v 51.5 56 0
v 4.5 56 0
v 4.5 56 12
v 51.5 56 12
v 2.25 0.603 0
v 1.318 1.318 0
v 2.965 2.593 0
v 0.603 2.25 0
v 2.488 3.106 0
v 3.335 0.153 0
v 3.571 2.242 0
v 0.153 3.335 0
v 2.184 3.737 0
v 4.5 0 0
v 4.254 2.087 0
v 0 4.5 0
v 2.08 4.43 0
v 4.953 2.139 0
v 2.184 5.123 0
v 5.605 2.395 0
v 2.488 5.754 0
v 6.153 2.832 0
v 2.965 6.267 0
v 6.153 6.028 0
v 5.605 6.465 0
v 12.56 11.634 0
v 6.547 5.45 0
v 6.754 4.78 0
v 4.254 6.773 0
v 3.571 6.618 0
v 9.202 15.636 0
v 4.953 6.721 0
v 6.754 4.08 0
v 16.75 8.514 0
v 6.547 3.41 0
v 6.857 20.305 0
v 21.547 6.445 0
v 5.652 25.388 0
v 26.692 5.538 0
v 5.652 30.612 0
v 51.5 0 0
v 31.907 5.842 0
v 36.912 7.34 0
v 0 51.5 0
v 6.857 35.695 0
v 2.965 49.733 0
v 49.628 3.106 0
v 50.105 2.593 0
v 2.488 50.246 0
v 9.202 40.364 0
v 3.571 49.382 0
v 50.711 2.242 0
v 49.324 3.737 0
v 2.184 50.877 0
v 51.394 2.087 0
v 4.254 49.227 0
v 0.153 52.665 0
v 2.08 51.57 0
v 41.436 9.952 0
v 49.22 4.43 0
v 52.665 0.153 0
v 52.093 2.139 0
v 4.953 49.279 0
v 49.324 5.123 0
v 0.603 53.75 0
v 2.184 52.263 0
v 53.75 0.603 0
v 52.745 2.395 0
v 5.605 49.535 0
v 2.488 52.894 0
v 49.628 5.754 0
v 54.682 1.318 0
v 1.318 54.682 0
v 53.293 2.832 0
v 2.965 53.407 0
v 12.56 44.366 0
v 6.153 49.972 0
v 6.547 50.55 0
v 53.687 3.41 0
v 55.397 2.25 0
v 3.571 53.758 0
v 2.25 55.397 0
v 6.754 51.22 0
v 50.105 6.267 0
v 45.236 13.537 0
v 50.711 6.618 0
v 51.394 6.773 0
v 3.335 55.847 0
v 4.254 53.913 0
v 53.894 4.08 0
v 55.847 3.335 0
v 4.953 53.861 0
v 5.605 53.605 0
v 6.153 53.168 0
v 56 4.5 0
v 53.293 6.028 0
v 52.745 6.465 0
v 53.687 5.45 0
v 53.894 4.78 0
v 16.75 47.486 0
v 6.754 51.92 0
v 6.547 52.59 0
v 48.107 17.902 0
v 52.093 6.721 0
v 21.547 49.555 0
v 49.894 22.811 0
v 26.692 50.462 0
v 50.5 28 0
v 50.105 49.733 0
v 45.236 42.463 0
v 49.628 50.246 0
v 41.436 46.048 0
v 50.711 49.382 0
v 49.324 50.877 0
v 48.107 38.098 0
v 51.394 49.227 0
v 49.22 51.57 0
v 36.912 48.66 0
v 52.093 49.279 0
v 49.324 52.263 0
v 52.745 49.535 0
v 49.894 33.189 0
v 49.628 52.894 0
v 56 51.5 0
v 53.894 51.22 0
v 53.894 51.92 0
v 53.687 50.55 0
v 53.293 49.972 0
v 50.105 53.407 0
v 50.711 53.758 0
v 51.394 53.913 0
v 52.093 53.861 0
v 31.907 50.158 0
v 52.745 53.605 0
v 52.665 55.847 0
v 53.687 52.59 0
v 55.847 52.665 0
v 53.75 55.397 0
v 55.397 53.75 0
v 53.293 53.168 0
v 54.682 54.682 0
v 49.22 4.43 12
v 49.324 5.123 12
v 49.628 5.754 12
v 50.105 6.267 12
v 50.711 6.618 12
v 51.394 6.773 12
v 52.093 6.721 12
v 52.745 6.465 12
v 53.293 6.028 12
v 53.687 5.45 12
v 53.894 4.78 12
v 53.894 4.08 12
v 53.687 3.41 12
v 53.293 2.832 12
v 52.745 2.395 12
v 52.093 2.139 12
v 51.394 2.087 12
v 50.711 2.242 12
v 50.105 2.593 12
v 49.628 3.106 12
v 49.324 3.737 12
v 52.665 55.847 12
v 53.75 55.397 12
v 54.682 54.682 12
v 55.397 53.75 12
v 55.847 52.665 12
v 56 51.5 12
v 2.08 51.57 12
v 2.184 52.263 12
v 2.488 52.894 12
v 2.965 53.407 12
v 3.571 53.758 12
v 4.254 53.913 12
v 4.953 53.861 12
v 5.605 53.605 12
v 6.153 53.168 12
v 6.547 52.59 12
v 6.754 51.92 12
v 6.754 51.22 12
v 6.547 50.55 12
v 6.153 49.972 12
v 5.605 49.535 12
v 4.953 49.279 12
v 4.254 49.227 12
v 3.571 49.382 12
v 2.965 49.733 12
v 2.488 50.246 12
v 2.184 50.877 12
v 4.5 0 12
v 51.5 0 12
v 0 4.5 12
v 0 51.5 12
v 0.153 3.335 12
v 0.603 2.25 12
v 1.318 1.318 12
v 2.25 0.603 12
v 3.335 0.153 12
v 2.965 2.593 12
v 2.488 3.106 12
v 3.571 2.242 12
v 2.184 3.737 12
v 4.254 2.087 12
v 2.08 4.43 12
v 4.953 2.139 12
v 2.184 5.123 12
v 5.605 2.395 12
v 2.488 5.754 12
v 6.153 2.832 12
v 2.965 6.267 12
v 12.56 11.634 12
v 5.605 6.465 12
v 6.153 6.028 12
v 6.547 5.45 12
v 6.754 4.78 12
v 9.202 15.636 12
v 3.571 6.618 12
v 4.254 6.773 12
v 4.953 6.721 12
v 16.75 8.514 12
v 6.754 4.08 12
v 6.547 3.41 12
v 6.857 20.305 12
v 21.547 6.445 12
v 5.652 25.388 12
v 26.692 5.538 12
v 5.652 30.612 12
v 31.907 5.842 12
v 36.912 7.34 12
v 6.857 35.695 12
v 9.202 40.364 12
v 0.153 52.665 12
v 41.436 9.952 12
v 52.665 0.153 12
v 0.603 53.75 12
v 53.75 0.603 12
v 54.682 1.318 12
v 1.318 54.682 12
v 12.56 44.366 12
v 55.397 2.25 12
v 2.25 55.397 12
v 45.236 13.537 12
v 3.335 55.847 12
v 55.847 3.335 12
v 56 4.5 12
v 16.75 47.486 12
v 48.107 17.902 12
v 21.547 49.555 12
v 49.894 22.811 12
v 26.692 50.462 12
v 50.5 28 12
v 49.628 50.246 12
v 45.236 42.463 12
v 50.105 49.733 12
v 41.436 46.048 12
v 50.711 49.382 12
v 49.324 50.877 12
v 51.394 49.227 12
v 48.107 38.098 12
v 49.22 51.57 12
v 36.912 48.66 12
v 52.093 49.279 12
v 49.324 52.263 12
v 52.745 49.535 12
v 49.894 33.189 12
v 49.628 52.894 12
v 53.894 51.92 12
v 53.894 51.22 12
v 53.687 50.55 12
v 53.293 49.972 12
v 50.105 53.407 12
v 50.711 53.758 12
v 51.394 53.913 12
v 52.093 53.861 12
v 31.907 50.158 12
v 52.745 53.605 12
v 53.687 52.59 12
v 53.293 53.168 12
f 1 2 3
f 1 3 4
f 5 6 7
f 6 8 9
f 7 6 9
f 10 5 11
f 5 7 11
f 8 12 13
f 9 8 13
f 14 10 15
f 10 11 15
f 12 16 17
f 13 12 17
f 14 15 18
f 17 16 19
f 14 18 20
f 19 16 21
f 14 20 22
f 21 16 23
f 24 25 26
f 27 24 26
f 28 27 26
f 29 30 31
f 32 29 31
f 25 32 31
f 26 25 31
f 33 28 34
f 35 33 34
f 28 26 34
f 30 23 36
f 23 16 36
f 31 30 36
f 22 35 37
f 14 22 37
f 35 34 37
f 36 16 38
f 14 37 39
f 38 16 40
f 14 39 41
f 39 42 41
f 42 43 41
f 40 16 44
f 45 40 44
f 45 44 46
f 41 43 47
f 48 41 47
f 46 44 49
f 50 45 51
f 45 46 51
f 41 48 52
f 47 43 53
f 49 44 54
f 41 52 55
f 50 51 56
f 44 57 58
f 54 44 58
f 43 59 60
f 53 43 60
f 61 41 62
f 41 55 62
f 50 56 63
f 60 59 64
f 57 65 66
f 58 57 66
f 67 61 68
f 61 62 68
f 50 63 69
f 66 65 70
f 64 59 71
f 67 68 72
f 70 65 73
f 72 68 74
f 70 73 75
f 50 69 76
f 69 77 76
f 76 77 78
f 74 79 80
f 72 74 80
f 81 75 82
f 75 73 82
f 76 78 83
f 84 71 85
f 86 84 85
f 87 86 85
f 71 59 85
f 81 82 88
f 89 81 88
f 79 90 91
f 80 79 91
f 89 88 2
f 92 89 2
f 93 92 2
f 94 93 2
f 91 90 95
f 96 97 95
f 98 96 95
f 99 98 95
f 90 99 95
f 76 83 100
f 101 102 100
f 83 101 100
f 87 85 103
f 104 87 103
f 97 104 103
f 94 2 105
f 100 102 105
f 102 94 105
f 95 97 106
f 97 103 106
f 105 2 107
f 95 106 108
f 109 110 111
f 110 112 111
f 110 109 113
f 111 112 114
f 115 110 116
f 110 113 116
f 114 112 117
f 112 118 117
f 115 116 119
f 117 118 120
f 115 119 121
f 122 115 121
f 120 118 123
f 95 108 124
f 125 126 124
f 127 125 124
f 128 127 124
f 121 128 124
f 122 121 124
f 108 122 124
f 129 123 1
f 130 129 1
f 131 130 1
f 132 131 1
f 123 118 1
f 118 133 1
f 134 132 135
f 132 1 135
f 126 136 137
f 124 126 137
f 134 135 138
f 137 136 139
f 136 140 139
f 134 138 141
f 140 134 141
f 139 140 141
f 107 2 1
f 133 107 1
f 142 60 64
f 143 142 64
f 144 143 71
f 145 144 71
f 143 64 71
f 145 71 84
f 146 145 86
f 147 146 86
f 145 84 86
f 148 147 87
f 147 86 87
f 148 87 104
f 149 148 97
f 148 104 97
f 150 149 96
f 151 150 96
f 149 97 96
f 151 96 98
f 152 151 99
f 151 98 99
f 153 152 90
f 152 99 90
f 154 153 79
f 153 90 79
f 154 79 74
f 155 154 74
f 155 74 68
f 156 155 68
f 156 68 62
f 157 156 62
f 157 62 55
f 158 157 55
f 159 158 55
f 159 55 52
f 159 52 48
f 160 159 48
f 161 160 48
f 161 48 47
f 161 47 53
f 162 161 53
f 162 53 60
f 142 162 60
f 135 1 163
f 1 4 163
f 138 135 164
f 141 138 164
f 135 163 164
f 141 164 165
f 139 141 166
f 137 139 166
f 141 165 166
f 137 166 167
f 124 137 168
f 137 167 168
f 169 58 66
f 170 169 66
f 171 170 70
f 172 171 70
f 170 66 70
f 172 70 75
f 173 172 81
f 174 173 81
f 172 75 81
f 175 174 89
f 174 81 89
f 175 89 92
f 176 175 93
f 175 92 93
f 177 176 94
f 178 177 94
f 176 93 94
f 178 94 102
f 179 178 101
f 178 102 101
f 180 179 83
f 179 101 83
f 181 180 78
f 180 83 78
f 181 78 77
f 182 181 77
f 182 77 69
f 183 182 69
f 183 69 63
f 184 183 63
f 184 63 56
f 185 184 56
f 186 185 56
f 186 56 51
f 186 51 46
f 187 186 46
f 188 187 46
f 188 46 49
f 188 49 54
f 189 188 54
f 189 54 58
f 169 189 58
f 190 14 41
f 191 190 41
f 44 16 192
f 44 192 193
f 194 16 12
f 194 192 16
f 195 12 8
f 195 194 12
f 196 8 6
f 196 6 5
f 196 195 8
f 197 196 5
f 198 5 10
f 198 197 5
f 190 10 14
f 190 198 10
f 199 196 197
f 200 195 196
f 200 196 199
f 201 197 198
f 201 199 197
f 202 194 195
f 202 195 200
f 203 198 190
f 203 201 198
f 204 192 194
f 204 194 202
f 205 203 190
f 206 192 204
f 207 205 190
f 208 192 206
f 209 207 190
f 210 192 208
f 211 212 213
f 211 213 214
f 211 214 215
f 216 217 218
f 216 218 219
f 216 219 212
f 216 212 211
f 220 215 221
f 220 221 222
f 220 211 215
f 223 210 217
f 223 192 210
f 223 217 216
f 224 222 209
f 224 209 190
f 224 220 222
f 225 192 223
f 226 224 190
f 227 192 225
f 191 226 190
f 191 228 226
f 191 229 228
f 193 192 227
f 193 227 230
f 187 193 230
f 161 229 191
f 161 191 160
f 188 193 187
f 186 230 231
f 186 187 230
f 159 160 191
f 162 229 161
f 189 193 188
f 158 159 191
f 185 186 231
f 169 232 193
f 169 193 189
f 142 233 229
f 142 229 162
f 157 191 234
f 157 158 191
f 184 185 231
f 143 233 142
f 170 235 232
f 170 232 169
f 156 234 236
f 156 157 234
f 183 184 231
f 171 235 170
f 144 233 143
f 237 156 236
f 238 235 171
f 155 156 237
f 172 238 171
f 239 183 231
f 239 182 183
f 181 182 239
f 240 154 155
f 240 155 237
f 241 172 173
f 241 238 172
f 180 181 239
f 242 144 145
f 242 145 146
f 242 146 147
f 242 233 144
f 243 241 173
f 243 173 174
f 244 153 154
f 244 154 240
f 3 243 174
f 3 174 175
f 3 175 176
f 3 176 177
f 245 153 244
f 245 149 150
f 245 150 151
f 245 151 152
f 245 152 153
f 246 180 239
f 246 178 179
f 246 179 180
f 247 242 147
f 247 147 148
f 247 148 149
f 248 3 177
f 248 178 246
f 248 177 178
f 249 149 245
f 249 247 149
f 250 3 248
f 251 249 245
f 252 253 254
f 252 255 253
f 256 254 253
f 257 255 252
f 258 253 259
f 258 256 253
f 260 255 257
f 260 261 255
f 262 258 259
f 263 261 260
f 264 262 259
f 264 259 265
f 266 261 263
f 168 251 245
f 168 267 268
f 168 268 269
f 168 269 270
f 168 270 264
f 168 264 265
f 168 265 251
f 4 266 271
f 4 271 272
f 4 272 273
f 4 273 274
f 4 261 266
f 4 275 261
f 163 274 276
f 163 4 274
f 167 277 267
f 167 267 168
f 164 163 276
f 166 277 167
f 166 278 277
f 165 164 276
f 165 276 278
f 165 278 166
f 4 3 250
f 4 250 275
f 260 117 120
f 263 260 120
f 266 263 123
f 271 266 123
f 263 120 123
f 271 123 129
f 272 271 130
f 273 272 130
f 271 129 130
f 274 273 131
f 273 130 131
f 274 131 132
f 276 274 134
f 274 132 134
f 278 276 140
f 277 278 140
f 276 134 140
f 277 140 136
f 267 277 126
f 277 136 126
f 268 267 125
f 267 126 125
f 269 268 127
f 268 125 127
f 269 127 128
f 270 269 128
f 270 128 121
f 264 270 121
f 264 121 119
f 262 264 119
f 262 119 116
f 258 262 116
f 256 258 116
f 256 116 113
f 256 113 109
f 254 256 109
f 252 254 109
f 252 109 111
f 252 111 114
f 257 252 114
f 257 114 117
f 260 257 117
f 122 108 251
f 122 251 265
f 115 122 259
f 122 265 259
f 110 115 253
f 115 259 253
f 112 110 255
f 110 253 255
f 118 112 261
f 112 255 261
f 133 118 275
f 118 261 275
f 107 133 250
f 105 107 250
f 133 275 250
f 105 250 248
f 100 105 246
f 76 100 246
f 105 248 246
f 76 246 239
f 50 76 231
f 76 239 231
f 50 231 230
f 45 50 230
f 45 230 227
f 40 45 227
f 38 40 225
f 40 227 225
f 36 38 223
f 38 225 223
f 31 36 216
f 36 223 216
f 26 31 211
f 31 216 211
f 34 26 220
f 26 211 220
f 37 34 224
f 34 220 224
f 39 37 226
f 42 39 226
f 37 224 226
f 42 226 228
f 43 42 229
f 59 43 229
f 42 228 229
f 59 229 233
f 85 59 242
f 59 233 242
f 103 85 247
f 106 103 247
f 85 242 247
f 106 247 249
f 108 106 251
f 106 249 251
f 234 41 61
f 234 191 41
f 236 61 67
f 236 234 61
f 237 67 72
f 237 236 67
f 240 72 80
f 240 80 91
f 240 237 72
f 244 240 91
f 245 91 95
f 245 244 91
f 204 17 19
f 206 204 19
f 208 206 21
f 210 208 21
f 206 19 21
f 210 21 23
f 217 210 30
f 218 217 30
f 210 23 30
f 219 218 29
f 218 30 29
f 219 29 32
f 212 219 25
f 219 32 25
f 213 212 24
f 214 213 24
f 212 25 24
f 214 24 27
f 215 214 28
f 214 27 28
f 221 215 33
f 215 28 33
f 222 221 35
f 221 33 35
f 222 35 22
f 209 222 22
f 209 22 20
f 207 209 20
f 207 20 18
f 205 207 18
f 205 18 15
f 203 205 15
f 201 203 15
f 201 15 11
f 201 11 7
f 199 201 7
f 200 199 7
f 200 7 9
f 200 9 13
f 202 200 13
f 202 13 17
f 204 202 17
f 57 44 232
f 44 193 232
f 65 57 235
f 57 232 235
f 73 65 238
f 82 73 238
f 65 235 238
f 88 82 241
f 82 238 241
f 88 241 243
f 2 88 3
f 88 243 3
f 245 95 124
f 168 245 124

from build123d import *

# Parameters (mm, degrees)
F0_W     = 56
F0_H     = 56
F1_DEPTH = 12
F2_R     = 22.5
F3_DEPTH = 12
F5_D     = 4.7
F6_R     = 4.5


with BuildPart() as f1:
    # F0 (on Top) → F1 (new body)
    with BuildSketch(Plane.XY):
        with Locations((28, 28)):
            Rectangle(F0_W, F0_H)
    extrude(amount=F1_DEPTH)

    # F2 (on face) → F3 (cut, through all)
    with BuildSketch(Plane.XY.offset(12)):
        with Locations((28, 28)):
            Circle(F2_R)
    extrude(amount=-F3_DEPTH, mode=Mode.SUBTRACT)

    # F5 (through all)
    with Locations(Plane.XY.offset(12)):
        with Locations((4.43, 51.57), (51.57, 51.57), (51.57, 4.43), (4.43, 4.43)):
            Hole(F5_D / 2)

    # F6
    f6_edges = [f1.edges().sort_by_distance(p)[0] for p in [
        (56, 56, 6),
        (56, 0, 6),
        (0, 0, 6),
        (0, 56, 6),
    ]]
    fillet(f6_edges, radius=F6_R)


solid = f1.part
